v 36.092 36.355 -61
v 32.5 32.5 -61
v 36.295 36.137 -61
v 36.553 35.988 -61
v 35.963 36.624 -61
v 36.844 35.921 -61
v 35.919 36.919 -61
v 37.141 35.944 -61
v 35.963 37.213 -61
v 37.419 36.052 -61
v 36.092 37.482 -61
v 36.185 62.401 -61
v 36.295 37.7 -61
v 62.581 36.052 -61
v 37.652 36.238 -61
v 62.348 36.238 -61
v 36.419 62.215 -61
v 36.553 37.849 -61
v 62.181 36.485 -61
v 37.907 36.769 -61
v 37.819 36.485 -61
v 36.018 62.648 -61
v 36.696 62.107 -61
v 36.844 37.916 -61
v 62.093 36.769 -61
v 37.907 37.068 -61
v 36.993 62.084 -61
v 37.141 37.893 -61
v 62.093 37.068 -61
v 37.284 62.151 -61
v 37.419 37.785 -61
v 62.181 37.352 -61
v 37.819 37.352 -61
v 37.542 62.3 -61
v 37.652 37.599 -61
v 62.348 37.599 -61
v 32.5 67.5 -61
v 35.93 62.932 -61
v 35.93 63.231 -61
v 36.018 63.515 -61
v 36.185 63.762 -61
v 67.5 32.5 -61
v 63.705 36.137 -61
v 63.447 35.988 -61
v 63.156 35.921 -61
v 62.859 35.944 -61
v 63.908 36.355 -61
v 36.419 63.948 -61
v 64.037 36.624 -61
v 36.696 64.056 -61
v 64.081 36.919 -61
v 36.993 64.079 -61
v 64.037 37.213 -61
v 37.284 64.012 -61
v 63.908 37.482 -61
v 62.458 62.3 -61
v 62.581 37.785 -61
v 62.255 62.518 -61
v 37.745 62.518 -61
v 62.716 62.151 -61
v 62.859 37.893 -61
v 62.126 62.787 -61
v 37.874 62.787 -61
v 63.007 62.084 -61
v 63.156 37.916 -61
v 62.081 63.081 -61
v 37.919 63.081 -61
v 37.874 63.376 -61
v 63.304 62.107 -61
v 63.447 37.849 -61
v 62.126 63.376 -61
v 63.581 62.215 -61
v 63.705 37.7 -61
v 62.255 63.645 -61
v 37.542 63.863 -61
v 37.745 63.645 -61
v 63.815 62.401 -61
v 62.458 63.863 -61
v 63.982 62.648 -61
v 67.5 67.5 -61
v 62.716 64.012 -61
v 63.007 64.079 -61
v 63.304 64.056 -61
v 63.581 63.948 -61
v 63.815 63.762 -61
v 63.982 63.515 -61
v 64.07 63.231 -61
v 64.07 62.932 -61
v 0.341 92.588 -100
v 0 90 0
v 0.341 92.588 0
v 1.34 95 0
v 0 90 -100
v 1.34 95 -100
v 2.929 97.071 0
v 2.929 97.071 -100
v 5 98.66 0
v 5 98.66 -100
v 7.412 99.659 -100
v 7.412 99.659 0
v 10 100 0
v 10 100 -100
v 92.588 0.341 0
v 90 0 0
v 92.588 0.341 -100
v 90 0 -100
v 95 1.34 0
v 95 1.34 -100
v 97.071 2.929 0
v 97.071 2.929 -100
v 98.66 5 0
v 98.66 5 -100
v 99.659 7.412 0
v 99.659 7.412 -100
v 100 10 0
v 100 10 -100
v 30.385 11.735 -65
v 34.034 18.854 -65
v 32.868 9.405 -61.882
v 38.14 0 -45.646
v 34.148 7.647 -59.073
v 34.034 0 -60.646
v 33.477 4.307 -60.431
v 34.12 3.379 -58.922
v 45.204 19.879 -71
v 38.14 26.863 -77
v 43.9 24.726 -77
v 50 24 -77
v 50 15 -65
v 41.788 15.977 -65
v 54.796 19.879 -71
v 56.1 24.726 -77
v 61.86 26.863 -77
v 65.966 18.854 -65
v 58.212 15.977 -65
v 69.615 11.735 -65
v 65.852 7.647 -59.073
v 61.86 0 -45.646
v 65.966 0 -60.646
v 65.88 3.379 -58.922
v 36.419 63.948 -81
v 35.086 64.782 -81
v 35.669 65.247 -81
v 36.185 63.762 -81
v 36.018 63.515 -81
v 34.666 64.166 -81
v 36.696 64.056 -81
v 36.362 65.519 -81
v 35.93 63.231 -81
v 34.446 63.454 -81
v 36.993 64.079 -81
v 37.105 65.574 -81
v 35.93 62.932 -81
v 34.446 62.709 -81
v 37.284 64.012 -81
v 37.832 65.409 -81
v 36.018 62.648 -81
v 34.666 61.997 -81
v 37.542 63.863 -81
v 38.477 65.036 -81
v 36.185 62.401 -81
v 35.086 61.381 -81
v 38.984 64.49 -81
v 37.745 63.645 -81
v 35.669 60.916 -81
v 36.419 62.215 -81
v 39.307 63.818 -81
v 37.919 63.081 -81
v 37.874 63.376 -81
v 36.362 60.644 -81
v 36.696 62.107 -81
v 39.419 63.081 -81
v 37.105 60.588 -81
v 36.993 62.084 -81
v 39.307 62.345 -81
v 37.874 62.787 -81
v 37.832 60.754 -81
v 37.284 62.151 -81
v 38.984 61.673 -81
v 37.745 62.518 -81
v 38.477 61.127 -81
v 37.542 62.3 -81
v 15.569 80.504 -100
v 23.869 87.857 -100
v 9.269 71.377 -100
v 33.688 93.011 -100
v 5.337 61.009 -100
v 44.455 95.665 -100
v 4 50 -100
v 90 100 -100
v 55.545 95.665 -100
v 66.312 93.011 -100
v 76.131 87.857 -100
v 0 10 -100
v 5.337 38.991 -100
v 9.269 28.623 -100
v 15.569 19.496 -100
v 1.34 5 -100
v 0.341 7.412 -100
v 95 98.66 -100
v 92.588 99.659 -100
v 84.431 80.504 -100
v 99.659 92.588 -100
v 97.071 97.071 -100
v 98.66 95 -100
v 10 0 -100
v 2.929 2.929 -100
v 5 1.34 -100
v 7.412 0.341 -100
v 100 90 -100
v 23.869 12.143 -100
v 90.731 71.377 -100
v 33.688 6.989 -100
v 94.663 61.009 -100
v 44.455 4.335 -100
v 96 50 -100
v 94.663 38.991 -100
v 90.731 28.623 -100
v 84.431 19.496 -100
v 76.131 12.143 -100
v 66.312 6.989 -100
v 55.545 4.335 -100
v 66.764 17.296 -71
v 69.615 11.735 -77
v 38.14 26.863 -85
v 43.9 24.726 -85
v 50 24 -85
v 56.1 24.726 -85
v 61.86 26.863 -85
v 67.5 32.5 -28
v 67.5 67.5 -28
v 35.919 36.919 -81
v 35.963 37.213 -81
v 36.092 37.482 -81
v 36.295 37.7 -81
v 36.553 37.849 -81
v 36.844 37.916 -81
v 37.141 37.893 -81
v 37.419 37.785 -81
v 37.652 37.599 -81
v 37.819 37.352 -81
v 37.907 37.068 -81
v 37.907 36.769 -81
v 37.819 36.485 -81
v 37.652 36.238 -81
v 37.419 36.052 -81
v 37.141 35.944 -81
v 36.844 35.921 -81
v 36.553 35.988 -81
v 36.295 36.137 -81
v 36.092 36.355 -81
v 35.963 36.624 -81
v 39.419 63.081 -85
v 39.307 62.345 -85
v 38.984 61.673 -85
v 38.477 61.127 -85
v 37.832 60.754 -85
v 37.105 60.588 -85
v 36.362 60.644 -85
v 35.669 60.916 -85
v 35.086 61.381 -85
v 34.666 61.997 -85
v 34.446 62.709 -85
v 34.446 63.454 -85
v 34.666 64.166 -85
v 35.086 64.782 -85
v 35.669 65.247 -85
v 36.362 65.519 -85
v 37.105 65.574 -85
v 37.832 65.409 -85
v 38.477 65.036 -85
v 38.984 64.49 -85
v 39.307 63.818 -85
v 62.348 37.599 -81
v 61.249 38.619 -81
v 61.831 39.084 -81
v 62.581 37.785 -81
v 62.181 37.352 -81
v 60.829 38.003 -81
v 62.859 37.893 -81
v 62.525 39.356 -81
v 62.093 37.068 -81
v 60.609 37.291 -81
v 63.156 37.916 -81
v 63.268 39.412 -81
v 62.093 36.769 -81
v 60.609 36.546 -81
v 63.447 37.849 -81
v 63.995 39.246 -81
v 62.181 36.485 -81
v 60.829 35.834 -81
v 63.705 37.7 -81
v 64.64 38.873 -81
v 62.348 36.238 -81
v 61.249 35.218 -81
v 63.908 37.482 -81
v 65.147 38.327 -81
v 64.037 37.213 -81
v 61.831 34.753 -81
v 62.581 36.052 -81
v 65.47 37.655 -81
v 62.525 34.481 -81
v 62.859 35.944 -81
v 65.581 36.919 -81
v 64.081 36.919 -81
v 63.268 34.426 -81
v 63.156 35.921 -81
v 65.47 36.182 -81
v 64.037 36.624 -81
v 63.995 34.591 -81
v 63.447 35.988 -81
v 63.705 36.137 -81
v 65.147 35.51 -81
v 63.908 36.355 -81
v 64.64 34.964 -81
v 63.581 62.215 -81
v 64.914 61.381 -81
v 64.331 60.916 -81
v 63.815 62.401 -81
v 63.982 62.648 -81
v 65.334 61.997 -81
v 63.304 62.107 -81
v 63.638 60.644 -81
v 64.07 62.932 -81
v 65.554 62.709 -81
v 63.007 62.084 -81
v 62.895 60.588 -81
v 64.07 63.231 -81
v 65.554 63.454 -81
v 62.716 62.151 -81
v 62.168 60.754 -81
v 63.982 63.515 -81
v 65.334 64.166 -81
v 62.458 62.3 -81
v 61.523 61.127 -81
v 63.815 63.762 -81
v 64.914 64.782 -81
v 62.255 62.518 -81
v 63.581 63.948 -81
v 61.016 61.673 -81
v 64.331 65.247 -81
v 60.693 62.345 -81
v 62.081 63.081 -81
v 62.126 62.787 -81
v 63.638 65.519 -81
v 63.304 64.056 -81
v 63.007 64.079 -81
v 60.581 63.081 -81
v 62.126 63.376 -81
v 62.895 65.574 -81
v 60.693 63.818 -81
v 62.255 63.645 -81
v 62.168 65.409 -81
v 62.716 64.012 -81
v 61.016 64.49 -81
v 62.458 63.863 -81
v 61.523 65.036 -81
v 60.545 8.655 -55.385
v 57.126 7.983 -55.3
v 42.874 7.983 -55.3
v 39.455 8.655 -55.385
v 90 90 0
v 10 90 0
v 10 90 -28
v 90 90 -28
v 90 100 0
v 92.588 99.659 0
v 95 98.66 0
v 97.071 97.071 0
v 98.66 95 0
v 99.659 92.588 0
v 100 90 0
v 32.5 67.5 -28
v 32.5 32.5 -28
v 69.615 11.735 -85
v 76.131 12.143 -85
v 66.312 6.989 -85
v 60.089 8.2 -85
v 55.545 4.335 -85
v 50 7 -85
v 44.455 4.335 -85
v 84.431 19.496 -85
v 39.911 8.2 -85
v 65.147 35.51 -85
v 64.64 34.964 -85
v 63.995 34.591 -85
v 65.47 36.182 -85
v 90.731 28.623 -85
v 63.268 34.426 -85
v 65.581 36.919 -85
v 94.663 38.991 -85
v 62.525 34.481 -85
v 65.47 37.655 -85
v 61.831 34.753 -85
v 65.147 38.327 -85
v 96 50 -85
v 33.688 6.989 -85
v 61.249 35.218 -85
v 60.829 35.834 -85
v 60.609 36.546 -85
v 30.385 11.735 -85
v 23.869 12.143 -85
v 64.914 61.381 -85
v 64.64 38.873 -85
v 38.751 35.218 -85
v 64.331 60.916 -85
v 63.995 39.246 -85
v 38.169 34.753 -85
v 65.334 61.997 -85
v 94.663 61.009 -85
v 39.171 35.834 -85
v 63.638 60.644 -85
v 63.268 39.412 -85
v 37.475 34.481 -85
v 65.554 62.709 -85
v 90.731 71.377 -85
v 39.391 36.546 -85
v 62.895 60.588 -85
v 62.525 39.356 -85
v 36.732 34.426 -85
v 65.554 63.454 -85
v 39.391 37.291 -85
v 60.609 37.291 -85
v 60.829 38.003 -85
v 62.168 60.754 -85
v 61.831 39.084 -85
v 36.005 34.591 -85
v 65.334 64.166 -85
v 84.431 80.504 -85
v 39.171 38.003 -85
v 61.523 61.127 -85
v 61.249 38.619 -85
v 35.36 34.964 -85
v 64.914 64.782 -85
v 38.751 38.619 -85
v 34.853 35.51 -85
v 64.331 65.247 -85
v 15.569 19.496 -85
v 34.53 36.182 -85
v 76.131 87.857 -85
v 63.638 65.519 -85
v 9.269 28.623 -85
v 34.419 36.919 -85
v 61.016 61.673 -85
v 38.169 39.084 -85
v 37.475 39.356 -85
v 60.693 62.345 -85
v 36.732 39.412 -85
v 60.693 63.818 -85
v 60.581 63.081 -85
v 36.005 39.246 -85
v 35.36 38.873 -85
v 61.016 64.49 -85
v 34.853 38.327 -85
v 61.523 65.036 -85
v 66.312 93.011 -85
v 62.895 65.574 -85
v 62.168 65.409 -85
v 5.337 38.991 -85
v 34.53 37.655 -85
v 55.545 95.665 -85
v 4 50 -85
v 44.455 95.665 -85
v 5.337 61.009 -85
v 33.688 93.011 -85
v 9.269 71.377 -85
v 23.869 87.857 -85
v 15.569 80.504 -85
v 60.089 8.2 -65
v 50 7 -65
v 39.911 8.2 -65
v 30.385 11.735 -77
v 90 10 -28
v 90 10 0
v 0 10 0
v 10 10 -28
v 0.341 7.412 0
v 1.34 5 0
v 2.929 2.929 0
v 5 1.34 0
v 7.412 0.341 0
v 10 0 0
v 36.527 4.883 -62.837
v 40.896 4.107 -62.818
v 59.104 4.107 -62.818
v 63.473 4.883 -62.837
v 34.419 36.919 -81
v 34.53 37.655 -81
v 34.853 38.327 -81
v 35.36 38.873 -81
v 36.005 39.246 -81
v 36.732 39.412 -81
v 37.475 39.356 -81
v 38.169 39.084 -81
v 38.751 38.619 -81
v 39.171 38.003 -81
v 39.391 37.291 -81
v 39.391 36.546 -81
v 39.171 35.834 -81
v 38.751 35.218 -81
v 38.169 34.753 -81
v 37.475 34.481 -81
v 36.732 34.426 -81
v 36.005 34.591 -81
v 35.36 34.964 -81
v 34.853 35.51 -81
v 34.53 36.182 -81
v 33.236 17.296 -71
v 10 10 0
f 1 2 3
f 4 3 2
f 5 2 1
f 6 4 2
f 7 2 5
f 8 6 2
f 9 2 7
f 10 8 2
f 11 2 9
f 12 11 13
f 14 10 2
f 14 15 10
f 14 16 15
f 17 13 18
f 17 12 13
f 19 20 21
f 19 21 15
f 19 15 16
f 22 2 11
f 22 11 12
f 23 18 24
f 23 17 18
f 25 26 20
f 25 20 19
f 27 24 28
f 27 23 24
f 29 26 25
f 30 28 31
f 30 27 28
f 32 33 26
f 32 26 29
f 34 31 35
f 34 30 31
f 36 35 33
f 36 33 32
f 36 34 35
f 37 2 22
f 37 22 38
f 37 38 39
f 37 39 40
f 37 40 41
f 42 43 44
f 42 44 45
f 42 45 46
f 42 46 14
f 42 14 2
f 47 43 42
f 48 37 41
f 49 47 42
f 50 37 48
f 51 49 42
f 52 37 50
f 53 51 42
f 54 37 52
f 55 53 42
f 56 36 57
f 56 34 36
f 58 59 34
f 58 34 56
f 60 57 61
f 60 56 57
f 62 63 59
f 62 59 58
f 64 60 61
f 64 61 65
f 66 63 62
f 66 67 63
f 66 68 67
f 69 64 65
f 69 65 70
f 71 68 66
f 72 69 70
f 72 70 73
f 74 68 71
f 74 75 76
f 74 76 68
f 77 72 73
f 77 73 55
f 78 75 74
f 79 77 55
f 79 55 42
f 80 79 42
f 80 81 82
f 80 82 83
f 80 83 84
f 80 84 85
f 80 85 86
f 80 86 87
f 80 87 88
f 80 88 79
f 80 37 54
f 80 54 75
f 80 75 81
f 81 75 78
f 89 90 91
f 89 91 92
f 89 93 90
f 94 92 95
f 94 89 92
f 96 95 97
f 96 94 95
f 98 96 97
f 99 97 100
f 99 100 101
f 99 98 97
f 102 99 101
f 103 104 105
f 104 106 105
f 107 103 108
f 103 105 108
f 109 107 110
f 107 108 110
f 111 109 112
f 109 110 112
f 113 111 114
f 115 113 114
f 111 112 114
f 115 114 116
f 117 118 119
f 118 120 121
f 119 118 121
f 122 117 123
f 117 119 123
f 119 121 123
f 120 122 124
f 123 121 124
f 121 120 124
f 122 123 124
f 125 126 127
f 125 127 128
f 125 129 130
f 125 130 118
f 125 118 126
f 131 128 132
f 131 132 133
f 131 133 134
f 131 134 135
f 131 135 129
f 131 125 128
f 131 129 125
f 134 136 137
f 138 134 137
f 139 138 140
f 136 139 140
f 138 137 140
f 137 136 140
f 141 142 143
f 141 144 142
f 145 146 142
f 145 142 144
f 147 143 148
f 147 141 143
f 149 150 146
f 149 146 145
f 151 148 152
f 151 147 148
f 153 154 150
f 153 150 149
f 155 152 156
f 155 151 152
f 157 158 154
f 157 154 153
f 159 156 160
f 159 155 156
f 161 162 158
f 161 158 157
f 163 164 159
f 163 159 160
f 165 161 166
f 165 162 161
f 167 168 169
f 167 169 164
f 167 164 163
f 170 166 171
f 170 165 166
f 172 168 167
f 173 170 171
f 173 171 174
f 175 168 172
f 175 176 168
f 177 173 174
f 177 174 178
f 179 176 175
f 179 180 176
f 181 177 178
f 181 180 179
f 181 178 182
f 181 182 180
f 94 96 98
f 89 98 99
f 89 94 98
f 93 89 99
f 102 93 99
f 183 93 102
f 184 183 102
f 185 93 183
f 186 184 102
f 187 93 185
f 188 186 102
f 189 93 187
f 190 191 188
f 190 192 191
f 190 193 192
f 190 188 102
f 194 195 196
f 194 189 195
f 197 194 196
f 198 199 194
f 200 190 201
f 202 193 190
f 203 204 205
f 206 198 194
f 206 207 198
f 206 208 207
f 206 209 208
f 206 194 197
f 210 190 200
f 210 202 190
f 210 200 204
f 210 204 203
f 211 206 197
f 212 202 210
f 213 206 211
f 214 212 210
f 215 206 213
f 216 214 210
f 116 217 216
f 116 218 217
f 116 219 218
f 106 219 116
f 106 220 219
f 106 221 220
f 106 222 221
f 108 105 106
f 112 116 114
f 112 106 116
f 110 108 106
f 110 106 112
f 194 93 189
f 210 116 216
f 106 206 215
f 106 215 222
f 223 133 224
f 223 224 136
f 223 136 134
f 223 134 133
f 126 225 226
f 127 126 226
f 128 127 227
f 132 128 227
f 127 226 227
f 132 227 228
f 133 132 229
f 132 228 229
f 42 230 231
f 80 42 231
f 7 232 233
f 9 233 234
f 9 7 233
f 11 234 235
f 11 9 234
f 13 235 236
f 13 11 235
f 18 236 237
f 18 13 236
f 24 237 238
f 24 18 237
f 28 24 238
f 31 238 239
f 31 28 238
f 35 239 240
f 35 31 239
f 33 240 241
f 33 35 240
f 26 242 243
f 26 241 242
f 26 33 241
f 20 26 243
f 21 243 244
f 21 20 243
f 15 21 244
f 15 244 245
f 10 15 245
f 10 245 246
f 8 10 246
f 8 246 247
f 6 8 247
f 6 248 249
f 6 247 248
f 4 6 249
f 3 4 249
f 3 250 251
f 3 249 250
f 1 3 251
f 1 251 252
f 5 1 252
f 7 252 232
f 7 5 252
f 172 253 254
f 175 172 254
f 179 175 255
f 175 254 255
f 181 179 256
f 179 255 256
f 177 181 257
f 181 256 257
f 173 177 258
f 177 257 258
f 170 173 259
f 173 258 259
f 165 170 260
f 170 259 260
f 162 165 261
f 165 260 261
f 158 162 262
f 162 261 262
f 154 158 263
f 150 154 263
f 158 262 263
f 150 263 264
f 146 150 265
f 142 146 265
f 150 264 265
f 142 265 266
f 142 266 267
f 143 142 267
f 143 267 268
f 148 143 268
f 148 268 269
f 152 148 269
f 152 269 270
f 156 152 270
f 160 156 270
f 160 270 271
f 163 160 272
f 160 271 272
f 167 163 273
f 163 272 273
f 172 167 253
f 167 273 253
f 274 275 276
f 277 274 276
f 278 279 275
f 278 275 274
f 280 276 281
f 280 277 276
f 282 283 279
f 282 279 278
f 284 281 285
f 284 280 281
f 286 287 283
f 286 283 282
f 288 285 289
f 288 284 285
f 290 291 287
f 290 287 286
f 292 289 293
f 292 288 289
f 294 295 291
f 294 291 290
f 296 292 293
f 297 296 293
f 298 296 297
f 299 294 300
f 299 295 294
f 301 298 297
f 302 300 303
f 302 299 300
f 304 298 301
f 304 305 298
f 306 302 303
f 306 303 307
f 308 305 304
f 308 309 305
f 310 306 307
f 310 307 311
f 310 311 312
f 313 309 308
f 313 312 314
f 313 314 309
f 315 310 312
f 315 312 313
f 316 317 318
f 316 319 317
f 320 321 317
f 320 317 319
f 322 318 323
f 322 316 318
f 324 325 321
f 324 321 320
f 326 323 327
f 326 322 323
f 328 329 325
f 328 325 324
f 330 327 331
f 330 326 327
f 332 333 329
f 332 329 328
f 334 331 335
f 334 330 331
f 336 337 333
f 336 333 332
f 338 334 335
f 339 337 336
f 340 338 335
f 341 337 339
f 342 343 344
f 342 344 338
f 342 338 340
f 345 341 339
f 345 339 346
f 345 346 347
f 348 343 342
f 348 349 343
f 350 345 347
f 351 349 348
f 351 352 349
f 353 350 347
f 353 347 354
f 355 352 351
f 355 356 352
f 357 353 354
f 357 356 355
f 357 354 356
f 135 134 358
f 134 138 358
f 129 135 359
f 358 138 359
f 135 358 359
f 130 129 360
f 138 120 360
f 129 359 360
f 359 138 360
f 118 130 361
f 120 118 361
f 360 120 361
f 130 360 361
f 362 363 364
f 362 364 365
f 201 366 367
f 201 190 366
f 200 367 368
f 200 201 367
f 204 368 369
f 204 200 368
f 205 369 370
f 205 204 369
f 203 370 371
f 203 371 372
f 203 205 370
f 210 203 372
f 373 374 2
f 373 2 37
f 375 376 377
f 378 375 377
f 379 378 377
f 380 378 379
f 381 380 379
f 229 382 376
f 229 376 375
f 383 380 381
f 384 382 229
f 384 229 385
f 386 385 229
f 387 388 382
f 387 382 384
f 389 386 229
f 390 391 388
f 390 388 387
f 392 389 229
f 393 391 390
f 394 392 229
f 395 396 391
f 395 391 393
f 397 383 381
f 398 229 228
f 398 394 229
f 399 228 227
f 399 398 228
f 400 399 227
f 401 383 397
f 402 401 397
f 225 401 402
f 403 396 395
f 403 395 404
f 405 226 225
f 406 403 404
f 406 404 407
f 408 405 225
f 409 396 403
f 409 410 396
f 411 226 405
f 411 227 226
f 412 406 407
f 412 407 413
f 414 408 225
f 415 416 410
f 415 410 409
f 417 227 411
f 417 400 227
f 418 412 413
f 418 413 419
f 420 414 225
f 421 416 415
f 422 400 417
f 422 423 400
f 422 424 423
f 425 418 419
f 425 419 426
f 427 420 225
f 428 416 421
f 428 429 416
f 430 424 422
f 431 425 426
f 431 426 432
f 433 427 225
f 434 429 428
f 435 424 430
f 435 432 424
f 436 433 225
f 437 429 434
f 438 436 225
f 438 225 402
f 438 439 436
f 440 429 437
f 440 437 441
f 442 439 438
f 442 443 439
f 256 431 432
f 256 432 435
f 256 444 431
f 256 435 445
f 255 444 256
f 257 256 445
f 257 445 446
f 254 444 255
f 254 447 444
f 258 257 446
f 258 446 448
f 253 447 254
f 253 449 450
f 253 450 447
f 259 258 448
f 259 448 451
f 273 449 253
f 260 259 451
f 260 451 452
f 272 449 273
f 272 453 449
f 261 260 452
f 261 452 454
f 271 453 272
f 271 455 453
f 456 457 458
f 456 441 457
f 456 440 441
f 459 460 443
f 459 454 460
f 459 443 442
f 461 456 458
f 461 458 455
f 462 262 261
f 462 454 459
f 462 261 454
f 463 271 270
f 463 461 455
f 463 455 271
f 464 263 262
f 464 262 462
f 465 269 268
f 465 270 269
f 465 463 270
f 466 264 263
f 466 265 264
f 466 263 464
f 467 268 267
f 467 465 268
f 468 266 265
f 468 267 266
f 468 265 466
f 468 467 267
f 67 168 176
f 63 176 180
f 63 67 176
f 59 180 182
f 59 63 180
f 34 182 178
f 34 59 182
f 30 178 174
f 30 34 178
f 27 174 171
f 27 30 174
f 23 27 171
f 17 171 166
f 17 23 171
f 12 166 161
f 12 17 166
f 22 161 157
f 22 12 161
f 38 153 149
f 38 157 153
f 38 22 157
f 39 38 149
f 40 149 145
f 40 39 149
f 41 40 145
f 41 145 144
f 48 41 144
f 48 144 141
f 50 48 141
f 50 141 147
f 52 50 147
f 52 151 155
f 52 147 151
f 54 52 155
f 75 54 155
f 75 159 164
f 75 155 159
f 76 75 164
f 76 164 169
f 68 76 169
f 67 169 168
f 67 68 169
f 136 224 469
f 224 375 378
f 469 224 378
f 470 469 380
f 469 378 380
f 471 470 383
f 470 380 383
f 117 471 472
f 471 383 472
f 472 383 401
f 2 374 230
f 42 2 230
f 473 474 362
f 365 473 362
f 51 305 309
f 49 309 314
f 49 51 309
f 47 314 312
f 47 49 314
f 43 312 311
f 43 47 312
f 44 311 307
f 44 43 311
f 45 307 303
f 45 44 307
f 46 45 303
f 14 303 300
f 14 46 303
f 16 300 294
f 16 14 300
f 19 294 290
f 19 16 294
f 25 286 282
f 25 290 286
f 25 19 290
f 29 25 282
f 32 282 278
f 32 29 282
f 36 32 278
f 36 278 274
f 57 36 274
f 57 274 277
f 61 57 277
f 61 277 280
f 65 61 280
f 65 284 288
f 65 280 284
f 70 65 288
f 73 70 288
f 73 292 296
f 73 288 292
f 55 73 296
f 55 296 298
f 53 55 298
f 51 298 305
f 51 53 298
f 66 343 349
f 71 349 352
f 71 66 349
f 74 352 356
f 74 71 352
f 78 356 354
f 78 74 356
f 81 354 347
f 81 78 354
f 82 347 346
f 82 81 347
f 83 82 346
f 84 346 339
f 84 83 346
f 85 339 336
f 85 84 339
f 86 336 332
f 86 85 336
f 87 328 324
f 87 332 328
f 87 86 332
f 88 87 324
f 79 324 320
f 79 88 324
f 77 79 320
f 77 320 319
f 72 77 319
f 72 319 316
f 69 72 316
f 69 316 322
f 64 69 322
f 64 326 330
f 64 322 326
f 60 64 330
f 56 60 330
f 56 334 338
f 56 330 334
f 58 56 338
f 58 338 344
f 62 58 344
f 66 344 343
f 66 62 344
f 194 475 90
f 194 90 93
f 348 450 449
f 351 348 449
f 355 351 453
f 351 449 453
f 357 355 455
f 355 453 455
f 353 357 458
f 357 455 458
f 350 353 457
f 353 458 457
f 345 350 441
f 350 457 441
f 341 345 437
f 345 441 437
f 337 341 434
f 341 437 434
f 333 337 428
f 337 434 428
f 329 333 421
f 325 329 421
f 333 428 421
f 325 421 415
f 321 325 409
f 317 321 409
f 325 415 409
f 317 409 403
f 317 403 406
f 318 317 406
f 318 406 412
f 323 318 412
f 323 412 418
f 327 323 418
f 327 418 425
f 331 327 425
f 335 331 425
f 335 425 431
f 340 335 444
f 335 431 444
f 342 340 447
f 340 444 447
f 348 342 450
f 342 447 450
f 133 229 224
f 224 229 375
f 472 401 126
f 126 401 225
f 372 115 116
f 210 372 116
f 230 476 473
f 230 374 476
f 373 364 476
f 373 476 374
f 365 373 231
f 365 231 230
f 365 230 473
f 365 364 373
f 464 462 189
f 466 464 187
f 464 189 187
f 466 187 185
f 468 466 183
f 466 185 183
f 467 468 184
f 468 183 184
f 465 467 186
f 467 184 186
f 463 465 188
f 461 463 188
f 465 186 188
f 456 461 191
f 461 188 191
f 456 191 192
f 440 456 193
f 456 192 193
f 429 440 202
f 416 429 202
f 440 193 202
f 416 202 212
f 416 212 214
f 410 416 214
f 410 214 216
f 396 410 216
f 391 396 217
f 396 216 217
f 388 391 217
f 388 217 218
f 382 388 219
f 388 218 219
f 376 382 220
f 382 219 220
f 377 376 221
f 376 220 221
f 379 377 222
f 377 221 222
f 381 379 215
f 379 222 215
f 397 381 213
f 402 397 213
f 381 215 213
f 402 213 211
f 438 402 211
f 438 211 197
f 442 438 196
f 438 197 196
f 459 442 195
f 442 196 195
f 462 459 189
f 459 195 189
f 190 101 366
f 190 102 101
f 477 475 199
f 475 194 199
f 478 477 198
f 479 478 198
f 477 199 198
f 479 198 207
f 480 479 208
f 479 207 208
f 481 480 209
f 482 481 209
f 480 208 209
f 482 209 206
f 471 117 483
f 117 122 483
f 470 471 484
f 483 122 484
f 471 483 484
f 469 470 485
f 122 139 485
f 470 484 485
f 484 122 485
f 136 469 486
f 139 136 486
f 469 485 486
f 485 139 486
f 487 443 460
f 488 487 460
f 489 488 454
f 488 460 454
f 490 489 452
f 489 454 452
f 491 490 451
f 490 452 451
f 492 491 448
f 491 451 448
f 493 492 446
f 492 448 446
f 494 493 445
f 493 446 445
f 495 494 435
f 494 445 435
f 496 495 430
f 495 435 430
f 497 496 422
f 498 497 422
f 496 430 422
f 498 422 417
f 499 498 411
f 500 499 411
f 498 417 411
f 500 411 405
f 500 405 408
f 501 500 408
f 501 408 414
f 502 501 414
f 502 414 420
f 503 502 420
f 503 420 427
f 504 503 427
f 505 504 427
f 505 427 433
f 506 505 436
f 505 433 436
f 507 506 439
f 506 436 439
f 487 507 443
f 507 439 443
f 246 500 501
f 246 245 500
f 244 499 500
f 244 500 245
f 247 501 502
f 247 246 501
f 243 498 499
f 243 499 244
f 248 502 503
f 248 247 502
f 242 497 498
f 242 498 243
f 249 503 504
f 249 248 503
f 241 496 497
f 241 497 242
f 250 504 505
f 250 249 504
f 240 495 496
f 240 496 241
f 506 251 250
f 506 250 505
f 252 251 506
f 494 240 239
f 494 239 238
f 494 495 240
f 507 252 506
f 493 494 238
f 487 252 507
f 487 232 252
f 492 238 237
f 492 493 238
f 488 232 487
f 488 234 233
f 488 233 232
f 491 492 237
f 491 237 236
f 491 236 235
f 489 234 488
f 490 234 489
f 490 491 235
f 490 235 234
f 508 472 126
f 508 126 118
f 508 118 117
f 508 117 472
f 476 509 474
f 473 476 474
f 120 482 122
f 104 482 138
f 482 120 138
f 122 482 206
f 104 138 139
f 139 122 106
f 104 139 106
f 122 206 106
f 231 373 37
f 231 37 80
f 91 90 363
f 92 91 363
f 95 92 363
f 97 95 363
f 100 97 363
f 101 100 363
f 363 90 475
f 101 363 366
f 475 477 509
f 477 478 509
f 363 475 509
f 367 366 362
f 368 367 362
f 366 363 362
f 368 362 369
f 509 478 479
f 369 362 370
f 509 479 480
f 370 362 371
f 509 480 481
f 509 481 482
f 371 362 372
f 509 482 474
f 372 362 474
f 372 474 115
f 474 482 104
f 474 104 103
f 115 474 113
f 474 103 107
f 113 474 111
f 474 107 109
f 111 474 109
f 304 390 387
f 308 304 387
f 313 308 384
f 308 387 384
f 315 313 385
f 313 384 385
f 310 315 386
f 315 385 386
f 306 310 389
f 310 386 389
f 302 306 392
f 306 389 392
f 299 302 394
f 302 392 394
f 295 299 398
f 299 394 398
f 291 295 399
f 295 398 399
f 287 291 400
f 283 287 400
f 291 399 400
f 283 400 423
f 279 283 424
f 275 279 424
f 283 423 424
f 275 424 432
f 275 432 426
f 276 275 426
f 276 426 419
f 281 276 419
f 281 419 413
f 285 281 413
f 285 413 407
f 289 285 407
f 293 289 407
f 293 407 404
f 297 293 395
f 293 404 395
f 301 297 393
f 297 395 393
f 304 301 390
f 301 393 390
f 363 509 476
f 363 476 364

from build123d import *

# Parameters (mm, degrees)
SKETCH_1_W                = 100
SKETCH_1_H                = 100
EXTRUDE_1_DEPTH           = 100
SKETCH_2_R                = 46
CUT_EXTRUDE_1_DEPTH       = 15
FILLET_1_R                = 10
CUT_EXTRUDE_2_DEPTH       = 8
SKETCH_8_W                = 80
SKETCH_8_H                = 80
CUT_EXTRUDE_7_DEPTH       = 28
SKETCH_9_W                = 35
SKETCH_9_H                = 35
CUT_EXTRUDE_8_DEPTH       = 33
SKETCH_10_R               = 2.5
CUT_EXTRUDE_9_DEPTH       = 4
CUT_EXTRUDE_10_DEPTH      = 163.975458275
CUT_EXTRUDE_10_DEPTH_BACK = 20
SKETCH_11_R               = 1


with BuildPart() as part:
    # 草图1 → 凸台-拉伸1 (new body)
    with BuildSketch(Plane(origin=(0, 0, 0), x_dir=(1, 0, 0), z_dir=(0, 1, 0))):
        with Locations((50, 50)):
            Rectangle(SKETCH_1_W, SKETCH_1_H)
    extrude(amount=EXTRUDE_1_DEPTH)

    # 草图2 → 切除-拉伸1 (cut)
    with BuildSketch(Plane(origin=(0, 0, -100), x_dir=(-1, 0, 0), z_dir=(0, 0, -1))):
        with Locations((-50, 50)):
            Circle(SKETCH_2_R)
    extrude(amount=-CUT_EXTRUDE_1_DEPTH, mode=Mode.SUBTRACT)

    # 圆角1
    fillet_1_edges = [part.edges().sort_by_distance(p)[0] for p in [
        (100, 100, -50),
        (0, 100, -50),
        (100, 0, -50),
        (0, 0, -50),
    ]]
    fillet(fillet_1_edges, radius=FILLET_1_R)

    # 草图3 → 切除-拉伸2 (cut)
    with BuildSketch(Plane(origin=(0, 0, -85), x_dir=(-1, 0, 0), z_dir=(0, 0, -1))):
        with BuildLine():
            Line((-61.860285343, 26.862722036), (-69.615087298, 11.734501829))
            ThreePointArc((-69.615087298, 11.734501829), (-50, 7), (-30.384912702, 11.734501829))
            Line((-30.384912702, 11.734501829), (-38.139714657, 26.862722036))
            ThreePointArc((-38.139714657, 26.862722036), (-50, 24), (-61.860285343, 26.862722036))
        make_face()
    extrude(amount=-CUT_EXTRUDE_2_DEPTH, mode=Mode.SUBTRACT)

    # 草图6 → section 1 of loft_1
    with BuildSketch(Plane(origin=(0, 0, -65), x_dir=(-1, 0, 0), z_dir=(0, 0, -1)), mode=Mode.PRIVATE) as loft_1_s1:
        with BuildLine():
            Line((-69.615087298, 11.734501829), (-65.965768731, 18.853664279))
            ThreePointArc((-65.965768731, 18.853664279), (-50, 15), (-34.034231269, 18.853664279))
            Line((-34.034231269, 18.853664279), (-30.384912702, 11.734501829))
            ThreePointArc((-30.384912702, 11.734501829), (-50, 7), (-69.615087298, 11.734501829))
        make_face()
    # loft from a face of the part (loft_1)
    loft([part.faces().sort_by_distance((50, 16.103496225, -77))[0], loft_1_s1.sketch], mode=Mode.SUBTRACT)

    # 草图6<3> for 切除-放样3 → 切除-放样3 section 0
    with BuildSketch(Plane(origin=(0, 0, -65), x_dir=(-1, 0, 0), z_dir=(0, 0, -1))):
        with BuildLine():
            Line((-69.615087298, 11.734501829), (-65.965768731, 18.853664279))
            # circular arc as an exact rational Bezier (weights 1, cos(half-angle), 1)
            Bezier((-65.965768731, 18.853664279), (-50, 10.669530728), (-34.034231269, 18.853664279), weights=[1, 0.889895306, 1])
            Line((-34.034231269, 18.853664279), (-30.384912702, 11.734501829))
            Bezier((-30.384912702, 11.734501829), (-50, 1.67970918), (-69.615087298, 11.734501829), weights=[1, 0.889895306, 1])
        make_face()
    # 草图7 → 切除-放样3 section 1
    with BuildSketch(Plane.XZ):
        with BuildLine():
            Line((65.965768731, -60.646196457), (34.034231269, -60.646196457))
            Line((34.034231269, -60.646196457), (38.139714657, -45.646196457))
            Line((38.139714657, -45.646196457), (61.860285343, -45.646196457))
            Line((61.860285343, -45.646196457), (65.965768731, -60.646196457))
        make_face()
    loft(mode=Mode.SUBTRACT)

    # 草图8 → 切除-拉伸7 (cut)
    with BuildSketch(Plane.XY):
        with Locations((50, 50)):
            Rectangle(SKETCH_8_W, SKETCH_8_H)
    extrude(amount=-CUT_EXTRUDE_7_DEPTH, mode=Mode.SUBTRACT)

    # 草图9 → 切除-拉伸8 (cut)
    with BuildSketch(Plane.XY.offset(-28)):
        with Locations((50, 50)):
            Rectangle(SKETCH_9_W, SKETCH_9_H)
    extrude(amount=-CUT_EXTRUDE_8_DEPTH, mode=Mode.SUBTRACT)

    # 草图10 → 切除-拉伸9 (cut)
    with BuildSketch(Plane(origin=(0, 0, -85), x_dir=(-1, 0, 0), z_dir=(0, 0, -1))):
        with Locations((-36.918524548, 36.918524548)):
            Circle(SKETCH_10_R)
        with Locations(Location((-36.918524548, 63.081475452, 0), (0, 0, 180))):
            Circle(SKETCH_10_R)
        with Locations(Location((-63.081475452, 36.918524548, 0), (0, 0, 180))):
            Circle(SKETCH_10_R)
        with Locations((-63.081475452, 63.081475452)):
            Circle(SKETCH_10_R)
    extrude(amount=-CUT_EXTRUDE_9_DEPTH, mode=Mode.SUBTRACT)

    # 草图11 → 切除-拉伸10 (cut, two sides: drawn at the far end of the back side and taken through both)
    with BuildSketch(Plane(origin=(0, 0, -81), x_dir=(-1, 0, 0), z_dir=(0, 0, -1)).offset(-CUT_EXTRUDE_10_DEPTH_BACK)):
        with Locations((-63.081475452, 63.081475452)):
            Circle(SKETCH_11_R)
        with Locations(Location((-36.918524548, 63.081475452, 0), (0, 0, 180))):
            Circle(SKETCH_11_R)
        with Locations(Location((-63.081475452, 36.918524548, 0), (0, 0, 180))):
            Circle(SKETCH_11_R)
        with Locations((-36.918524548, 36.918524548)):
            Circle(SKETCH_11_R)
    extrude(amount=CUT_EXTRUDE_10_DEPTH + CUT_EXTRUDE_10_DEPTH_BACK, mode=Mode.SUBTRACT)


solid = part.part
